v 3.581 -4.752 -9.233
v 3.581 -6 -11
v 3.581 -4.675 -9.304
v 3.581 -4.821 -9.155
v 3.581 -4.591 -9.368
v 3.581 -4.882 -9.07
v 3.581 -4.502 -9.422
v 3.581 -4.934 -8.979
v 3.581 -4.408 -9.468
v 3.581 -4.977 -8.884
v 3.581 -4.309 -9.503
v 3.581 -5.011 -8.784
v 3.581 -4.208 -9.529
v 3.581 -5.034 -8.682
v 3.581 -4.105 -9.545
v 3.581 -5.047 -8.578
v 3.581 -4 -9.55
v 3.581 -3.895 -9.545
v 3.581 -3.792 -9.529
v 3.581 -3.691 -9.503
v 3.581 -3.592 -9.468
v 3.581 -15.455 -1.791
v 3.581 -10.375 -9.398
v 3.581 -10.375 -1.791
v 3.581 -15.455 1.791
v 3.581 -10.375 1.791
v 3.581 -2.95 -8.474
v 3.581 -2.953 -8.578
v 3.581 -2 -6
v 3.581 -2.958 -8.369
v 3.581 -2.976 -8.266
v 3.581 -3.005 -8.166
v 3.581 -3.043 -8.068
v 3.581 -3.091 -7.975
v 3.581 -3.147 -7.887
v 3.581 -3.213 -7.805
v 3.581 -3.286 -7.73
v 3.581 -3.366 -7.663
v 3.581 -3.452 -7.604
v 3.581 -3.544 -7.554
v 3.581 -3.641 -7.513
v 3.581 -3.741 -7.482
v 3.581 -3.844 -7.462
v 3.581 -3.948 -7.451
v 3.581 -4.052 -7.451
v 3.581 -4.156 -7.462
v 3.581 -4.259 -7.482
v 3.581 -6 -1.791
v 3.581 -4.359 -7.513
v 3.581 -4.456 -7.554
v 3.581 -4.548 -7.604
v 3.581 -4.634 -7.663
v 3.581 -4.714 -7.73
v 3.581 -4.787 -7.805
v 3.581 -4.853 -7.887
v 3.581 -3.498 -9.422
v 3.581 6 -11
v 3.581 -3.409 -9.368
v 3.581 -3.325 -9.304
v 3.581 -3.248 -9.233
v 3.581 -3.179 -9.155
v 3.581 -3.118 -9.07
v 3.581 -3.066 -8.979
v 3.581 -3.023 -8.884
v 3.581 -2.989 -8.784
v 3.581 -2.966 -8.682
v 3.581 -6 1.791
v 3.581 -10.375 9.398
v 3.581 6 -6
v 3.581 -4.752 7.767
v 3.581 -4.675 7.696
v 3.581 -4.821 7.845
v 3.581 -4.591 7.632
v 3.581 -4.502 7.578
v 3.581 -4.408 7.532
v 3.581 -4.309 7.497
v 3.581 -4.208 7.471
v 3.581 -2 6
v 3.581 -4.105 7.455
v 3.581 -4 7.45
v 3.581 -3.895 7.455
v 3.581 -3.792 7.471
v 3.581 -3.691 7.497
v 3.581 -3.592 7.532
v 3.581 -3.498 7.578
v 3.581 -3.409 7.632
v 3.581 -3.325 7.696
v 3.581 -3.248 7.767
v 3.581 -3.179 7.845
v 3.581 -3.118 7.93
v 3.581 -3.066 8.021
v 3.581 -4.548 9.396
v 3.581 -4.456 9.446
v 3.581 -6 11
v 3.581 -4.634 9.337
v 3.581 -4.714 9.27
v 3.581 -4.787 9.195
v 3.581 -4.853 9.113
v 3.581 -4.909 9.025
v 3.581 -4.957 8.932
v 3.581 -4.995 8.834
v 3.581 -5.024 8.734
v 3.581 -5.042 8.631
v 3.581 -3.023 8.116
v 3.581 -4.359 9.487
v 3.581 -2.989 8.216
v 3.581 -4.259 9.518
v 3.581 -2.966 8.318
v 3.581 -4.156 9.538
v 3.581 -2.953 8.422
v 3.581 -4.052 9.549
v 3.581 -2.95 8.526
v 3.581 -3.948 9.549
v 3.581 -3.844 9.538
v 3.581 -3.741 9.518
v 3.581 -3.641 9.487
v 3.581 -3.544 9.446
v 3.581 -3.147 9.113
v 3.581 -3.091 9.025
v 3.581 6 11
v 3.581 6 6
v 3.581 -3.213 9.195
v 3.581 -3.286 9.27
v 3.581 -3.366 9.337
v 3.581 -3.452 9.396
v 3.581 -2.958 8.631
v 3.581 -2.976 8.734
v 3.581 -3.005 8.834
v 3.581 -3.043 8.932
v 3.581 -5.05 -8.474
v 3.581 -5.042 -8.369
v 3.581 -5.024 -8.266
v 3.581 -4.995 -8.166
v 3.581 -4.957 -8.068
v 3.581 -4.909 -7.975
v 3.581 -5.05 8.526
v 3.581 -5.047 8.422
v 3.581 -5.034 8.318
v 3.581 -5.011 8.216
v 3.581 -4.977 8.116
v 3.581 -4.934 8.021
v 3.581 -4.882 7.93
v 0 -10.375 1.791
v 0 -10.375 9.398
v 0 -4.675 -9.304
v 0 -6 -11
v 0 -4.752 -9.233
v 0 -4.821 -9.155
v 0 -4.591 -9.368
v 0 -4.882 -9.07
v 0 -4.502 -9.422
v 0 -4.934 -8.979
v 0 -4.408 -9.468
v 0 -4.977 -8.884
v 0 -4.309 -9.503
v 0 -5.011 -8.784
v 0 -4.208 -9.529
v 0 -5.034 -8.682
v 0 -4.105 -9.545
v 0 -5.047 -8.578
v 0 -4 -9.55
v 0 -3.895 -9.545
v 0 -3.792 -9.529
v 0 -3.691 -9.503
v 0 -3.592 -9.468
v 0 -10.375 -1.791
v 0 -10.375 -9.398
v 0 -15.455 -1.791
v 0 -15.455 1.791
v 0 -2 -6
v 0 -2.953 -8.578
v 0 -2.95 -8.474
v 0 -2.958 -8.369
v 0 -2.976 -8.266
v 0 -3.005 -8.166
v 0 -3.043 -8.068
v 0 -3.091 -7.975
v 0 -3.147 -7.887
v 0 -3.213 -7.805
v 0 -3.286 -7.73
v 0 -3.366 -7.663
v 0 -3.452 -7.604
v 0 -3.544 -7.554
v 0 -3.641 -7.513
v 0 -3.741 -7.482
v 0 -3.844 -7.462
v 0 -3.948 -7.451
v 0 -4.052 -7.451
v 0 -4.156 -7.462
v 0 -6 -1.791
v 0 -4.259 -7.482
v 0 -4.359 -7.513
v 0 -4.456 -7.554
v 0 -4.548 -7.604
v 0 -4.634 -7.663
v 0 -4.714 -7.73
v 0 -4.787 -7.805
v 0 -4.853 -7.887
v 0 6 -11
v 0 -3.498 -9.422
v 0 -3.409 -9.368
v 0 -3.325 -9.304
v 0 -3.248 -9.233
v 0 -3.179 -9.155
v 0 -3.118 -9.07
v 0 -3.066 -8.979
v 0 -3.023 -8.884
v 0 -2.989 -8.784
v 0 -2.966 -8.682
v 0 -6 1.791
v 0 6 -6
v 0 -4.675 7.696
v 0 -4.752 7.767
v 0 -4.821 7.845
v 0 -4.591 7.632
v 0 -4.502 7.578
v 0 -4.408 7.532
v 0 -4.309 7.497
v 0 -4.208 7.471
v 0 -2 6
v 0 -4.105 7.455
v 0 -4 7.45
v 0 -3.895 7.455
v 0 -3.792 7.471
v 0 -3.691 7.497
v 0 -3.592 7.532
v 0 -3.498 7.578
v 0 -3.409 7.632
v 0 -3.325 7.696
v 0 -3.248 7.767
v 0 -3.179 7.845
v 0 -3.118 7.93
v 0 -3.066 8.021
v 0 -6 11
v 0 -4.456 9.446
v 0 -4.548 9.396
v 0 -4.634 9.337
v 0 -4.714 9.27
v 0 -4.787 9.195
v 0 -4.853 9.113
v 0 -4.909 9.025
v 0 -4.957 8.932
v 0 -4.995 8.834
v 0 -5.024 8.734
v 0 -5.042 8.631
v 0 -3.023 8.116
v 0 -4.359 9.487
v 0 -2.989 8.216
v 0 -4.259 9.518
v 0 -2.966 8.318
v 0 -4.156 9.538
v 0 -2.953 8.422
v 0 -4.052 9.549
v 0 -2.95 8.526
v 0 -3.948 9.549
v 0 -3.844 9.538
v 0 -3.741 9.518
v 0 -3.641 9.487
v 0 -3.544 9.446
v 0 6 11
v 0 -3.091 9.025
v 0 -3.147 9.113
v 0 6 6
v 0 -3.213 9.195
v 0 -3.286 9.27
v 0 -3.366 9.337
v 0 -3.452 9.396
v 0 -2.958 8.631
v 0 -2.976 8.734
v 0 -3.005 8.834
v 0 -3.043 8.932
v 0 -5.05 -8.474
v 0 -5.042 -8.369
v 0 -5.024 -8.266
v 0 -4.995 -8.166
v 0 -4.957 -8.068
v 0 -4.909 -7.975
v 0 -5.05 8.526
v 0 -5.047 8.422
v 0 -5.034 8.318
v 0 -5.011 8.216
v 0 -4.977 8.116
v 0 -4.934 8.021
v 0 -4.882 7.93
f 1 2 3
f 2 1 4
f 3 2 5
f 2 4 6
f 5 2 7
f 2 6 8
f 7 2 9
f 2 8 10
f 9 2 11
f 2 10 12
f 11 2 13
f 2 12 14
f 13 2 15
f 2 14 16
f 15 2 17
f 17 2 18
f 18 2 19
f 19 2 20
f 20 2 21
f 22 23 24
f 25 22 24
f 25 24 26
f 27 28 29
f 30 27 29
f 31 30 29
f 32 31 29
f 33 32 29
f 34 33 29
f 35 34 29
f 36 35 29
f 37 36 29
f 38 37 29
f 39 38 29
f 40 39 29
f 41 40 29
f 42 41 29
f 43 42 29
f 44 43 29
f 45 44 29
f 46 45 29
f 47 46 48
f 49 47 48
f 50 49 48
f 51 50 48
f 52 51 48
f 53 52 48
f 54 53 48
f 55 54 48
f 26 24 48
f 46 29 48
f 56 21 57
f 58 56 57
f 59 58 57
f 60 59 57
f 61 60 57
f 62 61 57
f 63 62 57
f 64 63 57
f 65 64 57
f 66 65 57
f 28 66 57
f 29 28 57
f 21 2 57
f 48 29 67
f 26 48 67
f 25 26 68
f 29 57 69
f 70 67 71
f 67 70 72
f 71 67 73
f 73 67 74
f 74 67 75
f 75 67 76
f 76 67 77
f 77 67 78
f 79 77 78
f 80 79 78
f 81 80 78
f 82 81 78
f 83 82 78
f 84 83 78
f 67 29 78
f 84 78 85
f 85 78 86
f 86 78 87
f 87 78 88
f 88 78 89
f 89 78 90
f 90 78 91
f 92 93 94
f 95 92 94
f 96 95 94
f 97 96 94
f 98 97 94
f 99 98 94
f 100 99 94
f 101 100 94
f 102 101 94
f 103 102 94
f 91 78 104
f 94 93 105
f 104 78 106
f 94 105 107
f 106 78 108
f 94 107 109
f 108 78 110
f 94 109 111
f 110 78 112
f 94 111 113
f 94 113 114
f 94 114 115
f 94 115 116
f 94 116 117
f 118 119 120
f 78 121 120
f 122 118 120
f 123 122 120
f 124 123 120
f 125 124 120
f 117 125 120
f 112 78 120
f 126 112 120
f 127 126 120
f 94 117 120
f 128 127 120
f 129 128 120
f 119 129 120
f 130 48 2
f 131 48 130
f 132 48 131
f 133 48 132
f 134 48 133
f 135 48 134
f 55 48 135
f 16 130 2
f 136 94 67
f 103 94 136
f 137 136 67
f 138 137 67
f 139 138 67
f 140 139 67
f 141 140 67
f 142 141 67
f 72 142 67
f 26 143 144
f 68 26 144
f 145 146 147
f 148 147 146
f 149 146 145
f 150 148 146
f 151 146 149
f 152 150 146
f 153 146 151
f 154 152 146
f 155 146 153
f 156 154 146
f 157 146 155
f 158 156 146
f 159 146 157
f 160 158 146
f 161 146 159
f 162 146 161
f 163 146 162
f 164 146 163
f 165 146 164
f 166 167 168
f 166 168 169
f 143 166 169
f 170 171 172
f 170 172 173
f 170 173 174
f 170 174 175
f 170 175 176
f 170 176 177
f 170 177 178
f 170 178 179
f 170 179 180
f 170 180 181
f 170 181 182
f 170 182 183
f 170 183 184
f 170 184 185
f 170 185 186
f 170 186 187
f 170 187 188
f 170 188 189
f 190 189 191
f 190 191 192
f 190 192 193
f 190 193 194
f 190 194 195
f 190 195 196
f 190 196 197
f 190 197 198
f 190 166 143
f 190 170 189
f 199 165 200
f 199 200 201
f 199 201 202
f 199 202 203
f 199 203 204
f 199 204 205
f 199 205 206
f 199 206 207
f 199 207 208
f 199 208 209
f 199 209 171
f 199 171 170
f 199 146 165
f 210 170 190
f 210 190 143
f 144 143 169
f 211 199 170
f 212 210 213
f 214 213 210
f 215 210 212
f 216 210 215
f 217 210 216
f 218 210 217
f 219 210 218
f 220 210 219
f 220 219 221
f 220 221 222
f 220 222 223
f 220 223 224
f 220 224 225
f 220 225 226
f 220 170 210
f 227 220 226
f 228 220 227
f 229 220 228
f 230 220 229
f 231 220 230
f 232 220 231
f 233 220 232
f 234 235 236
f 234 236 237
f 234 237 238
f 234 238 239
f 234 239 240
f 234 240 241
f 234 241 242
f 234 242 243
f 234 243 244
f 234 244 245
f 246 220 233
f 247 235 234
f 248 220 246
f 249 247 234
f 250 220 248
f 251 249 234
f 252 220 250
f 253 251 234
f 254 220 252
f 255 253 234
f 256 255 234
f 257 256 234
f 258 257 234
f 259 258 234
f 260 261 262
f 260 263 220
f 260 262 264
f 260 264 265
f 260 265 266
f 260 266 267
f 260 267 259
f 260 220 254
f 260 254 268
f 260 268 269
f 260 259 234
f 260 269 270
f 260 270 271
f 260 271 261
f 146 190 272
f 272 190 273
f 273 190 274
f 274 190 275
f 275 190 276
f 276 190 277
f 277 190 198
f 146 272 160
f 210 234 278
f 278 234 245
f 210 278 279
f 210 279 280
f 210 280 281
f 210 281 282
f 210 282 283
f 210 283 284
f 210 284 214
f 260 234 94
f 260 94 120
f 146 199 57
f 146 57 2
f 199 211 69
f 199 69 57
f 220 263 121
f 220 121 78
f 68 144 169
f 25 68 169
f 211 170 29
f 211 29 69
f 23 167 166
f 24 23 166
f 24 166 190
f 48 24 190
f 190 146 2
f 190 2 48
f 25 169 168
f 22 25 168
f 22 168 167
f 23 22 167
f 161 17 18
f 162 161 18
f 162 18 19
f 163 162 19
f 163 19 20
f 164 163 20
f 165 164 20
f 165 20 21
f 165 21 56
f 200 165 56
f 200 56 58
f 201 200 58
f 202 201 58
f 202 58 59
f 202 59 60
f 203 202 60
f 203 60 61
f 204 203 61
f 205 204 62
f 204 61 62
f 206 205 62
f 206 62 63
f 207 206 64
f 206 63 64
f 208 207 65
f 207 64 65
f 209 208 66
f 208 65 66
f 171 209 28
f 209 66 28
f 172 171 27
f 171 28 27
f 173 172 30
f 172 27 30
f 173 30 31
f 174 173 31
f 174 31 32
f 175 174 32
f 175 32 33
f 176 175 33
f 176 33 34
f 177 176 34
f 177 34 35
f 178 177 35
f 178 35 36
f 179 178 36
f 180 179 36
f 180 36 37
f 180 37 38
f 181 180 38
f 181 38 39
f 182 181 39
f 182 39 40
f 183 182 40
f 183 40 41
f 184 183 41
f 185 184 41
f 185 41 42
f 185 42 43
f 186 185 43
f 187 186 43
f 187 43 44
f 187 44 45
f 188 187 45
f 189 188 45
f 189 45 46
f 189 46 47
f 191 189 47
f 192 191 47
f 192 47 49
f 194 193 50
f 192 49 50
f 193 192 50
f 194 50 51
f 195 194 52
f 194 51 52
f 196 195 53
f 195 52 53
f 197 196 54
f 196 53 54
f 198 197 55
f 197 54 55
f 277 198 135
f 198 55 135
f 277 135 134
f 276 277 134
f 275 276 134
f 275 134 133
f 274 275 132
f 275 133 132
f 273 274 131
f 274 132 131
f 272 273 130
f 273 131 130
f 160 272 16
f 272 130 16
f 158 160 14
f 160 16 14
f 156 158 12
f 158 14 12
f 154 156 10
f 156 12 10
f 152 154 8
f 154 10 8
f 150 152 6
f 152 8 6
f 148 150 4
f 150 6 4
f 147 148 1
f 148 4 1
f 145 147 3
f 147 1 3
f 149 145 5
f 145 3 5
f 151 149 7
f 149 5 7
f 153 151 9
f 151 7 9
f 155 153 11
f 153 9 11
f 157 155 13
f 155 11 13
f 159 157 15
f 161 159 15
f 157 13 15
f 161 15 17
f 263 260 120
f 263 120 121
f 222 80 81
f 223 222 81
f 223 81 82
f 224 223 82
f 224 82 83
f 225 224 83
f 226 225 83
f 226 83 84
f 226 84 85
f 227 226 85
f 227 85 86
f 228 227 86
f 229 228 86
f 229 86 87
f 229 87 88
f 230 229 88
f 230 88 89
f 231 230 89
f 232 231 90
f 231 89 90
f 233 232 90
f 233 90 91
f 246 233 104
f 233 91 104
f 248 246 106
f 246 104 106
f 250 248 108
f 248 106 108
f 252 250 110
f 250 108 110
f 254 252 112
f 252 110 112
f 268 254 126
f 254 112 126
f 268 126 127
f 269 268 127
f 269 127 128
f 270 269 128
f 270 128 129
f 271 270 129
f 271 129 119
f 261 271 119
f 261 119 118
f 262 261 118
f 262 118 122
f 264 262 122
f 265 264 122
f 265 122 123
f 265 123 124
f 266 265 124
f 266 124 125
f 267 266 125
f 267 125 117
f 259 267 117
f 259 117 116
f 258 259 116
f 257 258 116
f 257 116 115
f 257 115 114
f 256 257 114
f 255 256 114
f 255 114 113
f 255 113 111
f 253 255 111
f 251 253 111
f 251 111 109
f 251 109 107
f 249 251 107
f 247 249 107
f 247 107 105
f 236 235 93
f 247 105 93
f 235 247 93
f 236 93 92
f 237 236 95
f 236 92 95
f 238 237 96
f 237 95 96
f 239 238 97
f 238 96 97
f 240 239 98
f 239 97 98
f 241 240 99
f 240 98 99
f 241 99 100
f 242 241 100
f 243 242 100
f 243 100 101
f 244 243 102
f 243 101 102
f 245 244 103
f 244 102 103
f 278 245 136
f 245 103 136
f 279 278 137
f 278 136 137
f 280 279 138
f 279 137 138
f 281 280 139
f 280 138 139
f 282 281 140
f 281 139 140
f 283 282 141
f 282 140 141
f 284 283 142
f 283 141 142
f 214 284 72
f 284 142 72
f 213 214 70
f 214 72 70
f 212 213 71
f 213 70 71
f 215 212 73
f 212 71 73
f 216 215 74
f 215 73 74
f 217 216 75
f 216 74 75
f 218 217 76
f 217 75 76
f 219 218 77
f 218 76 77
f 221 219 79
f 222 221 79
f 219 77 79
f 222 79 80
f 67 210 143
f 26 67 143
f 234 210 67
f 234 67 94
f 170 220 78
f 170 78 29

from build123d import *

# Parameters (mm, degrees)
BOSS_EXTRUDE1_DEPTH = 3.5814
SKETCH7_R           = 1.05
CUT_EXTRUDE5_DEPTH  = 14.03174685
BOSS_EXTRUDE3_DEPTH = 3.5814


with BuildPart() as part:
    # Sketch1 → Boss-Extrude1 (new body)
    with BuildSketch(Plane(origin=(0, 0, 0), x_dir=(0, 0, -1), z_dir=(1, 0, 0))):
        Polygon((-6, 6), (-6, -2), (6, -2), (6, 6), (11, 6), (11, -6), (-11, -6), (-11, 6), align=None)
    extrude(amount=BOSS_EXTRUDE1_DEPTH)

    # Sketch7 → Cut-Extrude5 (cut, through all)
    with BuildSketch(Plane(origin=(3.5814, 0, 0), x_dir=(0, 0, -1), z_dir=(1, 0, 0))):
        with Locations((-8.5, -4)):
            Circle(SKETCH7_R)
        with Locations((8.5, -4)):
            Circle(SKETCH7_R)
    extrude(amount=-CUT_EXTRUDE5_DEPTH, mode=Mode.SUBTRACT)

    # Sketch8 → Boss-Extrude3 (add)
    with BuildSketch(Plane(origin=(0, 0, 0), x_dir=(0, 0, -1), z_dir=(1, 0, 0))):
        Polygon((-1.7907, -10.3749976), (-9.398, -10.3749976), (-1.7907, -15.4549976), (1.7907, -15.4549976), (9.398, -10.3749976), (1.7907, -10.3749976), (1.7907, -6), (-1.7907, -6), align=None)
    extrude(amount=BOSS_EXTRUDE3_DEPTH)


solid = part.part
